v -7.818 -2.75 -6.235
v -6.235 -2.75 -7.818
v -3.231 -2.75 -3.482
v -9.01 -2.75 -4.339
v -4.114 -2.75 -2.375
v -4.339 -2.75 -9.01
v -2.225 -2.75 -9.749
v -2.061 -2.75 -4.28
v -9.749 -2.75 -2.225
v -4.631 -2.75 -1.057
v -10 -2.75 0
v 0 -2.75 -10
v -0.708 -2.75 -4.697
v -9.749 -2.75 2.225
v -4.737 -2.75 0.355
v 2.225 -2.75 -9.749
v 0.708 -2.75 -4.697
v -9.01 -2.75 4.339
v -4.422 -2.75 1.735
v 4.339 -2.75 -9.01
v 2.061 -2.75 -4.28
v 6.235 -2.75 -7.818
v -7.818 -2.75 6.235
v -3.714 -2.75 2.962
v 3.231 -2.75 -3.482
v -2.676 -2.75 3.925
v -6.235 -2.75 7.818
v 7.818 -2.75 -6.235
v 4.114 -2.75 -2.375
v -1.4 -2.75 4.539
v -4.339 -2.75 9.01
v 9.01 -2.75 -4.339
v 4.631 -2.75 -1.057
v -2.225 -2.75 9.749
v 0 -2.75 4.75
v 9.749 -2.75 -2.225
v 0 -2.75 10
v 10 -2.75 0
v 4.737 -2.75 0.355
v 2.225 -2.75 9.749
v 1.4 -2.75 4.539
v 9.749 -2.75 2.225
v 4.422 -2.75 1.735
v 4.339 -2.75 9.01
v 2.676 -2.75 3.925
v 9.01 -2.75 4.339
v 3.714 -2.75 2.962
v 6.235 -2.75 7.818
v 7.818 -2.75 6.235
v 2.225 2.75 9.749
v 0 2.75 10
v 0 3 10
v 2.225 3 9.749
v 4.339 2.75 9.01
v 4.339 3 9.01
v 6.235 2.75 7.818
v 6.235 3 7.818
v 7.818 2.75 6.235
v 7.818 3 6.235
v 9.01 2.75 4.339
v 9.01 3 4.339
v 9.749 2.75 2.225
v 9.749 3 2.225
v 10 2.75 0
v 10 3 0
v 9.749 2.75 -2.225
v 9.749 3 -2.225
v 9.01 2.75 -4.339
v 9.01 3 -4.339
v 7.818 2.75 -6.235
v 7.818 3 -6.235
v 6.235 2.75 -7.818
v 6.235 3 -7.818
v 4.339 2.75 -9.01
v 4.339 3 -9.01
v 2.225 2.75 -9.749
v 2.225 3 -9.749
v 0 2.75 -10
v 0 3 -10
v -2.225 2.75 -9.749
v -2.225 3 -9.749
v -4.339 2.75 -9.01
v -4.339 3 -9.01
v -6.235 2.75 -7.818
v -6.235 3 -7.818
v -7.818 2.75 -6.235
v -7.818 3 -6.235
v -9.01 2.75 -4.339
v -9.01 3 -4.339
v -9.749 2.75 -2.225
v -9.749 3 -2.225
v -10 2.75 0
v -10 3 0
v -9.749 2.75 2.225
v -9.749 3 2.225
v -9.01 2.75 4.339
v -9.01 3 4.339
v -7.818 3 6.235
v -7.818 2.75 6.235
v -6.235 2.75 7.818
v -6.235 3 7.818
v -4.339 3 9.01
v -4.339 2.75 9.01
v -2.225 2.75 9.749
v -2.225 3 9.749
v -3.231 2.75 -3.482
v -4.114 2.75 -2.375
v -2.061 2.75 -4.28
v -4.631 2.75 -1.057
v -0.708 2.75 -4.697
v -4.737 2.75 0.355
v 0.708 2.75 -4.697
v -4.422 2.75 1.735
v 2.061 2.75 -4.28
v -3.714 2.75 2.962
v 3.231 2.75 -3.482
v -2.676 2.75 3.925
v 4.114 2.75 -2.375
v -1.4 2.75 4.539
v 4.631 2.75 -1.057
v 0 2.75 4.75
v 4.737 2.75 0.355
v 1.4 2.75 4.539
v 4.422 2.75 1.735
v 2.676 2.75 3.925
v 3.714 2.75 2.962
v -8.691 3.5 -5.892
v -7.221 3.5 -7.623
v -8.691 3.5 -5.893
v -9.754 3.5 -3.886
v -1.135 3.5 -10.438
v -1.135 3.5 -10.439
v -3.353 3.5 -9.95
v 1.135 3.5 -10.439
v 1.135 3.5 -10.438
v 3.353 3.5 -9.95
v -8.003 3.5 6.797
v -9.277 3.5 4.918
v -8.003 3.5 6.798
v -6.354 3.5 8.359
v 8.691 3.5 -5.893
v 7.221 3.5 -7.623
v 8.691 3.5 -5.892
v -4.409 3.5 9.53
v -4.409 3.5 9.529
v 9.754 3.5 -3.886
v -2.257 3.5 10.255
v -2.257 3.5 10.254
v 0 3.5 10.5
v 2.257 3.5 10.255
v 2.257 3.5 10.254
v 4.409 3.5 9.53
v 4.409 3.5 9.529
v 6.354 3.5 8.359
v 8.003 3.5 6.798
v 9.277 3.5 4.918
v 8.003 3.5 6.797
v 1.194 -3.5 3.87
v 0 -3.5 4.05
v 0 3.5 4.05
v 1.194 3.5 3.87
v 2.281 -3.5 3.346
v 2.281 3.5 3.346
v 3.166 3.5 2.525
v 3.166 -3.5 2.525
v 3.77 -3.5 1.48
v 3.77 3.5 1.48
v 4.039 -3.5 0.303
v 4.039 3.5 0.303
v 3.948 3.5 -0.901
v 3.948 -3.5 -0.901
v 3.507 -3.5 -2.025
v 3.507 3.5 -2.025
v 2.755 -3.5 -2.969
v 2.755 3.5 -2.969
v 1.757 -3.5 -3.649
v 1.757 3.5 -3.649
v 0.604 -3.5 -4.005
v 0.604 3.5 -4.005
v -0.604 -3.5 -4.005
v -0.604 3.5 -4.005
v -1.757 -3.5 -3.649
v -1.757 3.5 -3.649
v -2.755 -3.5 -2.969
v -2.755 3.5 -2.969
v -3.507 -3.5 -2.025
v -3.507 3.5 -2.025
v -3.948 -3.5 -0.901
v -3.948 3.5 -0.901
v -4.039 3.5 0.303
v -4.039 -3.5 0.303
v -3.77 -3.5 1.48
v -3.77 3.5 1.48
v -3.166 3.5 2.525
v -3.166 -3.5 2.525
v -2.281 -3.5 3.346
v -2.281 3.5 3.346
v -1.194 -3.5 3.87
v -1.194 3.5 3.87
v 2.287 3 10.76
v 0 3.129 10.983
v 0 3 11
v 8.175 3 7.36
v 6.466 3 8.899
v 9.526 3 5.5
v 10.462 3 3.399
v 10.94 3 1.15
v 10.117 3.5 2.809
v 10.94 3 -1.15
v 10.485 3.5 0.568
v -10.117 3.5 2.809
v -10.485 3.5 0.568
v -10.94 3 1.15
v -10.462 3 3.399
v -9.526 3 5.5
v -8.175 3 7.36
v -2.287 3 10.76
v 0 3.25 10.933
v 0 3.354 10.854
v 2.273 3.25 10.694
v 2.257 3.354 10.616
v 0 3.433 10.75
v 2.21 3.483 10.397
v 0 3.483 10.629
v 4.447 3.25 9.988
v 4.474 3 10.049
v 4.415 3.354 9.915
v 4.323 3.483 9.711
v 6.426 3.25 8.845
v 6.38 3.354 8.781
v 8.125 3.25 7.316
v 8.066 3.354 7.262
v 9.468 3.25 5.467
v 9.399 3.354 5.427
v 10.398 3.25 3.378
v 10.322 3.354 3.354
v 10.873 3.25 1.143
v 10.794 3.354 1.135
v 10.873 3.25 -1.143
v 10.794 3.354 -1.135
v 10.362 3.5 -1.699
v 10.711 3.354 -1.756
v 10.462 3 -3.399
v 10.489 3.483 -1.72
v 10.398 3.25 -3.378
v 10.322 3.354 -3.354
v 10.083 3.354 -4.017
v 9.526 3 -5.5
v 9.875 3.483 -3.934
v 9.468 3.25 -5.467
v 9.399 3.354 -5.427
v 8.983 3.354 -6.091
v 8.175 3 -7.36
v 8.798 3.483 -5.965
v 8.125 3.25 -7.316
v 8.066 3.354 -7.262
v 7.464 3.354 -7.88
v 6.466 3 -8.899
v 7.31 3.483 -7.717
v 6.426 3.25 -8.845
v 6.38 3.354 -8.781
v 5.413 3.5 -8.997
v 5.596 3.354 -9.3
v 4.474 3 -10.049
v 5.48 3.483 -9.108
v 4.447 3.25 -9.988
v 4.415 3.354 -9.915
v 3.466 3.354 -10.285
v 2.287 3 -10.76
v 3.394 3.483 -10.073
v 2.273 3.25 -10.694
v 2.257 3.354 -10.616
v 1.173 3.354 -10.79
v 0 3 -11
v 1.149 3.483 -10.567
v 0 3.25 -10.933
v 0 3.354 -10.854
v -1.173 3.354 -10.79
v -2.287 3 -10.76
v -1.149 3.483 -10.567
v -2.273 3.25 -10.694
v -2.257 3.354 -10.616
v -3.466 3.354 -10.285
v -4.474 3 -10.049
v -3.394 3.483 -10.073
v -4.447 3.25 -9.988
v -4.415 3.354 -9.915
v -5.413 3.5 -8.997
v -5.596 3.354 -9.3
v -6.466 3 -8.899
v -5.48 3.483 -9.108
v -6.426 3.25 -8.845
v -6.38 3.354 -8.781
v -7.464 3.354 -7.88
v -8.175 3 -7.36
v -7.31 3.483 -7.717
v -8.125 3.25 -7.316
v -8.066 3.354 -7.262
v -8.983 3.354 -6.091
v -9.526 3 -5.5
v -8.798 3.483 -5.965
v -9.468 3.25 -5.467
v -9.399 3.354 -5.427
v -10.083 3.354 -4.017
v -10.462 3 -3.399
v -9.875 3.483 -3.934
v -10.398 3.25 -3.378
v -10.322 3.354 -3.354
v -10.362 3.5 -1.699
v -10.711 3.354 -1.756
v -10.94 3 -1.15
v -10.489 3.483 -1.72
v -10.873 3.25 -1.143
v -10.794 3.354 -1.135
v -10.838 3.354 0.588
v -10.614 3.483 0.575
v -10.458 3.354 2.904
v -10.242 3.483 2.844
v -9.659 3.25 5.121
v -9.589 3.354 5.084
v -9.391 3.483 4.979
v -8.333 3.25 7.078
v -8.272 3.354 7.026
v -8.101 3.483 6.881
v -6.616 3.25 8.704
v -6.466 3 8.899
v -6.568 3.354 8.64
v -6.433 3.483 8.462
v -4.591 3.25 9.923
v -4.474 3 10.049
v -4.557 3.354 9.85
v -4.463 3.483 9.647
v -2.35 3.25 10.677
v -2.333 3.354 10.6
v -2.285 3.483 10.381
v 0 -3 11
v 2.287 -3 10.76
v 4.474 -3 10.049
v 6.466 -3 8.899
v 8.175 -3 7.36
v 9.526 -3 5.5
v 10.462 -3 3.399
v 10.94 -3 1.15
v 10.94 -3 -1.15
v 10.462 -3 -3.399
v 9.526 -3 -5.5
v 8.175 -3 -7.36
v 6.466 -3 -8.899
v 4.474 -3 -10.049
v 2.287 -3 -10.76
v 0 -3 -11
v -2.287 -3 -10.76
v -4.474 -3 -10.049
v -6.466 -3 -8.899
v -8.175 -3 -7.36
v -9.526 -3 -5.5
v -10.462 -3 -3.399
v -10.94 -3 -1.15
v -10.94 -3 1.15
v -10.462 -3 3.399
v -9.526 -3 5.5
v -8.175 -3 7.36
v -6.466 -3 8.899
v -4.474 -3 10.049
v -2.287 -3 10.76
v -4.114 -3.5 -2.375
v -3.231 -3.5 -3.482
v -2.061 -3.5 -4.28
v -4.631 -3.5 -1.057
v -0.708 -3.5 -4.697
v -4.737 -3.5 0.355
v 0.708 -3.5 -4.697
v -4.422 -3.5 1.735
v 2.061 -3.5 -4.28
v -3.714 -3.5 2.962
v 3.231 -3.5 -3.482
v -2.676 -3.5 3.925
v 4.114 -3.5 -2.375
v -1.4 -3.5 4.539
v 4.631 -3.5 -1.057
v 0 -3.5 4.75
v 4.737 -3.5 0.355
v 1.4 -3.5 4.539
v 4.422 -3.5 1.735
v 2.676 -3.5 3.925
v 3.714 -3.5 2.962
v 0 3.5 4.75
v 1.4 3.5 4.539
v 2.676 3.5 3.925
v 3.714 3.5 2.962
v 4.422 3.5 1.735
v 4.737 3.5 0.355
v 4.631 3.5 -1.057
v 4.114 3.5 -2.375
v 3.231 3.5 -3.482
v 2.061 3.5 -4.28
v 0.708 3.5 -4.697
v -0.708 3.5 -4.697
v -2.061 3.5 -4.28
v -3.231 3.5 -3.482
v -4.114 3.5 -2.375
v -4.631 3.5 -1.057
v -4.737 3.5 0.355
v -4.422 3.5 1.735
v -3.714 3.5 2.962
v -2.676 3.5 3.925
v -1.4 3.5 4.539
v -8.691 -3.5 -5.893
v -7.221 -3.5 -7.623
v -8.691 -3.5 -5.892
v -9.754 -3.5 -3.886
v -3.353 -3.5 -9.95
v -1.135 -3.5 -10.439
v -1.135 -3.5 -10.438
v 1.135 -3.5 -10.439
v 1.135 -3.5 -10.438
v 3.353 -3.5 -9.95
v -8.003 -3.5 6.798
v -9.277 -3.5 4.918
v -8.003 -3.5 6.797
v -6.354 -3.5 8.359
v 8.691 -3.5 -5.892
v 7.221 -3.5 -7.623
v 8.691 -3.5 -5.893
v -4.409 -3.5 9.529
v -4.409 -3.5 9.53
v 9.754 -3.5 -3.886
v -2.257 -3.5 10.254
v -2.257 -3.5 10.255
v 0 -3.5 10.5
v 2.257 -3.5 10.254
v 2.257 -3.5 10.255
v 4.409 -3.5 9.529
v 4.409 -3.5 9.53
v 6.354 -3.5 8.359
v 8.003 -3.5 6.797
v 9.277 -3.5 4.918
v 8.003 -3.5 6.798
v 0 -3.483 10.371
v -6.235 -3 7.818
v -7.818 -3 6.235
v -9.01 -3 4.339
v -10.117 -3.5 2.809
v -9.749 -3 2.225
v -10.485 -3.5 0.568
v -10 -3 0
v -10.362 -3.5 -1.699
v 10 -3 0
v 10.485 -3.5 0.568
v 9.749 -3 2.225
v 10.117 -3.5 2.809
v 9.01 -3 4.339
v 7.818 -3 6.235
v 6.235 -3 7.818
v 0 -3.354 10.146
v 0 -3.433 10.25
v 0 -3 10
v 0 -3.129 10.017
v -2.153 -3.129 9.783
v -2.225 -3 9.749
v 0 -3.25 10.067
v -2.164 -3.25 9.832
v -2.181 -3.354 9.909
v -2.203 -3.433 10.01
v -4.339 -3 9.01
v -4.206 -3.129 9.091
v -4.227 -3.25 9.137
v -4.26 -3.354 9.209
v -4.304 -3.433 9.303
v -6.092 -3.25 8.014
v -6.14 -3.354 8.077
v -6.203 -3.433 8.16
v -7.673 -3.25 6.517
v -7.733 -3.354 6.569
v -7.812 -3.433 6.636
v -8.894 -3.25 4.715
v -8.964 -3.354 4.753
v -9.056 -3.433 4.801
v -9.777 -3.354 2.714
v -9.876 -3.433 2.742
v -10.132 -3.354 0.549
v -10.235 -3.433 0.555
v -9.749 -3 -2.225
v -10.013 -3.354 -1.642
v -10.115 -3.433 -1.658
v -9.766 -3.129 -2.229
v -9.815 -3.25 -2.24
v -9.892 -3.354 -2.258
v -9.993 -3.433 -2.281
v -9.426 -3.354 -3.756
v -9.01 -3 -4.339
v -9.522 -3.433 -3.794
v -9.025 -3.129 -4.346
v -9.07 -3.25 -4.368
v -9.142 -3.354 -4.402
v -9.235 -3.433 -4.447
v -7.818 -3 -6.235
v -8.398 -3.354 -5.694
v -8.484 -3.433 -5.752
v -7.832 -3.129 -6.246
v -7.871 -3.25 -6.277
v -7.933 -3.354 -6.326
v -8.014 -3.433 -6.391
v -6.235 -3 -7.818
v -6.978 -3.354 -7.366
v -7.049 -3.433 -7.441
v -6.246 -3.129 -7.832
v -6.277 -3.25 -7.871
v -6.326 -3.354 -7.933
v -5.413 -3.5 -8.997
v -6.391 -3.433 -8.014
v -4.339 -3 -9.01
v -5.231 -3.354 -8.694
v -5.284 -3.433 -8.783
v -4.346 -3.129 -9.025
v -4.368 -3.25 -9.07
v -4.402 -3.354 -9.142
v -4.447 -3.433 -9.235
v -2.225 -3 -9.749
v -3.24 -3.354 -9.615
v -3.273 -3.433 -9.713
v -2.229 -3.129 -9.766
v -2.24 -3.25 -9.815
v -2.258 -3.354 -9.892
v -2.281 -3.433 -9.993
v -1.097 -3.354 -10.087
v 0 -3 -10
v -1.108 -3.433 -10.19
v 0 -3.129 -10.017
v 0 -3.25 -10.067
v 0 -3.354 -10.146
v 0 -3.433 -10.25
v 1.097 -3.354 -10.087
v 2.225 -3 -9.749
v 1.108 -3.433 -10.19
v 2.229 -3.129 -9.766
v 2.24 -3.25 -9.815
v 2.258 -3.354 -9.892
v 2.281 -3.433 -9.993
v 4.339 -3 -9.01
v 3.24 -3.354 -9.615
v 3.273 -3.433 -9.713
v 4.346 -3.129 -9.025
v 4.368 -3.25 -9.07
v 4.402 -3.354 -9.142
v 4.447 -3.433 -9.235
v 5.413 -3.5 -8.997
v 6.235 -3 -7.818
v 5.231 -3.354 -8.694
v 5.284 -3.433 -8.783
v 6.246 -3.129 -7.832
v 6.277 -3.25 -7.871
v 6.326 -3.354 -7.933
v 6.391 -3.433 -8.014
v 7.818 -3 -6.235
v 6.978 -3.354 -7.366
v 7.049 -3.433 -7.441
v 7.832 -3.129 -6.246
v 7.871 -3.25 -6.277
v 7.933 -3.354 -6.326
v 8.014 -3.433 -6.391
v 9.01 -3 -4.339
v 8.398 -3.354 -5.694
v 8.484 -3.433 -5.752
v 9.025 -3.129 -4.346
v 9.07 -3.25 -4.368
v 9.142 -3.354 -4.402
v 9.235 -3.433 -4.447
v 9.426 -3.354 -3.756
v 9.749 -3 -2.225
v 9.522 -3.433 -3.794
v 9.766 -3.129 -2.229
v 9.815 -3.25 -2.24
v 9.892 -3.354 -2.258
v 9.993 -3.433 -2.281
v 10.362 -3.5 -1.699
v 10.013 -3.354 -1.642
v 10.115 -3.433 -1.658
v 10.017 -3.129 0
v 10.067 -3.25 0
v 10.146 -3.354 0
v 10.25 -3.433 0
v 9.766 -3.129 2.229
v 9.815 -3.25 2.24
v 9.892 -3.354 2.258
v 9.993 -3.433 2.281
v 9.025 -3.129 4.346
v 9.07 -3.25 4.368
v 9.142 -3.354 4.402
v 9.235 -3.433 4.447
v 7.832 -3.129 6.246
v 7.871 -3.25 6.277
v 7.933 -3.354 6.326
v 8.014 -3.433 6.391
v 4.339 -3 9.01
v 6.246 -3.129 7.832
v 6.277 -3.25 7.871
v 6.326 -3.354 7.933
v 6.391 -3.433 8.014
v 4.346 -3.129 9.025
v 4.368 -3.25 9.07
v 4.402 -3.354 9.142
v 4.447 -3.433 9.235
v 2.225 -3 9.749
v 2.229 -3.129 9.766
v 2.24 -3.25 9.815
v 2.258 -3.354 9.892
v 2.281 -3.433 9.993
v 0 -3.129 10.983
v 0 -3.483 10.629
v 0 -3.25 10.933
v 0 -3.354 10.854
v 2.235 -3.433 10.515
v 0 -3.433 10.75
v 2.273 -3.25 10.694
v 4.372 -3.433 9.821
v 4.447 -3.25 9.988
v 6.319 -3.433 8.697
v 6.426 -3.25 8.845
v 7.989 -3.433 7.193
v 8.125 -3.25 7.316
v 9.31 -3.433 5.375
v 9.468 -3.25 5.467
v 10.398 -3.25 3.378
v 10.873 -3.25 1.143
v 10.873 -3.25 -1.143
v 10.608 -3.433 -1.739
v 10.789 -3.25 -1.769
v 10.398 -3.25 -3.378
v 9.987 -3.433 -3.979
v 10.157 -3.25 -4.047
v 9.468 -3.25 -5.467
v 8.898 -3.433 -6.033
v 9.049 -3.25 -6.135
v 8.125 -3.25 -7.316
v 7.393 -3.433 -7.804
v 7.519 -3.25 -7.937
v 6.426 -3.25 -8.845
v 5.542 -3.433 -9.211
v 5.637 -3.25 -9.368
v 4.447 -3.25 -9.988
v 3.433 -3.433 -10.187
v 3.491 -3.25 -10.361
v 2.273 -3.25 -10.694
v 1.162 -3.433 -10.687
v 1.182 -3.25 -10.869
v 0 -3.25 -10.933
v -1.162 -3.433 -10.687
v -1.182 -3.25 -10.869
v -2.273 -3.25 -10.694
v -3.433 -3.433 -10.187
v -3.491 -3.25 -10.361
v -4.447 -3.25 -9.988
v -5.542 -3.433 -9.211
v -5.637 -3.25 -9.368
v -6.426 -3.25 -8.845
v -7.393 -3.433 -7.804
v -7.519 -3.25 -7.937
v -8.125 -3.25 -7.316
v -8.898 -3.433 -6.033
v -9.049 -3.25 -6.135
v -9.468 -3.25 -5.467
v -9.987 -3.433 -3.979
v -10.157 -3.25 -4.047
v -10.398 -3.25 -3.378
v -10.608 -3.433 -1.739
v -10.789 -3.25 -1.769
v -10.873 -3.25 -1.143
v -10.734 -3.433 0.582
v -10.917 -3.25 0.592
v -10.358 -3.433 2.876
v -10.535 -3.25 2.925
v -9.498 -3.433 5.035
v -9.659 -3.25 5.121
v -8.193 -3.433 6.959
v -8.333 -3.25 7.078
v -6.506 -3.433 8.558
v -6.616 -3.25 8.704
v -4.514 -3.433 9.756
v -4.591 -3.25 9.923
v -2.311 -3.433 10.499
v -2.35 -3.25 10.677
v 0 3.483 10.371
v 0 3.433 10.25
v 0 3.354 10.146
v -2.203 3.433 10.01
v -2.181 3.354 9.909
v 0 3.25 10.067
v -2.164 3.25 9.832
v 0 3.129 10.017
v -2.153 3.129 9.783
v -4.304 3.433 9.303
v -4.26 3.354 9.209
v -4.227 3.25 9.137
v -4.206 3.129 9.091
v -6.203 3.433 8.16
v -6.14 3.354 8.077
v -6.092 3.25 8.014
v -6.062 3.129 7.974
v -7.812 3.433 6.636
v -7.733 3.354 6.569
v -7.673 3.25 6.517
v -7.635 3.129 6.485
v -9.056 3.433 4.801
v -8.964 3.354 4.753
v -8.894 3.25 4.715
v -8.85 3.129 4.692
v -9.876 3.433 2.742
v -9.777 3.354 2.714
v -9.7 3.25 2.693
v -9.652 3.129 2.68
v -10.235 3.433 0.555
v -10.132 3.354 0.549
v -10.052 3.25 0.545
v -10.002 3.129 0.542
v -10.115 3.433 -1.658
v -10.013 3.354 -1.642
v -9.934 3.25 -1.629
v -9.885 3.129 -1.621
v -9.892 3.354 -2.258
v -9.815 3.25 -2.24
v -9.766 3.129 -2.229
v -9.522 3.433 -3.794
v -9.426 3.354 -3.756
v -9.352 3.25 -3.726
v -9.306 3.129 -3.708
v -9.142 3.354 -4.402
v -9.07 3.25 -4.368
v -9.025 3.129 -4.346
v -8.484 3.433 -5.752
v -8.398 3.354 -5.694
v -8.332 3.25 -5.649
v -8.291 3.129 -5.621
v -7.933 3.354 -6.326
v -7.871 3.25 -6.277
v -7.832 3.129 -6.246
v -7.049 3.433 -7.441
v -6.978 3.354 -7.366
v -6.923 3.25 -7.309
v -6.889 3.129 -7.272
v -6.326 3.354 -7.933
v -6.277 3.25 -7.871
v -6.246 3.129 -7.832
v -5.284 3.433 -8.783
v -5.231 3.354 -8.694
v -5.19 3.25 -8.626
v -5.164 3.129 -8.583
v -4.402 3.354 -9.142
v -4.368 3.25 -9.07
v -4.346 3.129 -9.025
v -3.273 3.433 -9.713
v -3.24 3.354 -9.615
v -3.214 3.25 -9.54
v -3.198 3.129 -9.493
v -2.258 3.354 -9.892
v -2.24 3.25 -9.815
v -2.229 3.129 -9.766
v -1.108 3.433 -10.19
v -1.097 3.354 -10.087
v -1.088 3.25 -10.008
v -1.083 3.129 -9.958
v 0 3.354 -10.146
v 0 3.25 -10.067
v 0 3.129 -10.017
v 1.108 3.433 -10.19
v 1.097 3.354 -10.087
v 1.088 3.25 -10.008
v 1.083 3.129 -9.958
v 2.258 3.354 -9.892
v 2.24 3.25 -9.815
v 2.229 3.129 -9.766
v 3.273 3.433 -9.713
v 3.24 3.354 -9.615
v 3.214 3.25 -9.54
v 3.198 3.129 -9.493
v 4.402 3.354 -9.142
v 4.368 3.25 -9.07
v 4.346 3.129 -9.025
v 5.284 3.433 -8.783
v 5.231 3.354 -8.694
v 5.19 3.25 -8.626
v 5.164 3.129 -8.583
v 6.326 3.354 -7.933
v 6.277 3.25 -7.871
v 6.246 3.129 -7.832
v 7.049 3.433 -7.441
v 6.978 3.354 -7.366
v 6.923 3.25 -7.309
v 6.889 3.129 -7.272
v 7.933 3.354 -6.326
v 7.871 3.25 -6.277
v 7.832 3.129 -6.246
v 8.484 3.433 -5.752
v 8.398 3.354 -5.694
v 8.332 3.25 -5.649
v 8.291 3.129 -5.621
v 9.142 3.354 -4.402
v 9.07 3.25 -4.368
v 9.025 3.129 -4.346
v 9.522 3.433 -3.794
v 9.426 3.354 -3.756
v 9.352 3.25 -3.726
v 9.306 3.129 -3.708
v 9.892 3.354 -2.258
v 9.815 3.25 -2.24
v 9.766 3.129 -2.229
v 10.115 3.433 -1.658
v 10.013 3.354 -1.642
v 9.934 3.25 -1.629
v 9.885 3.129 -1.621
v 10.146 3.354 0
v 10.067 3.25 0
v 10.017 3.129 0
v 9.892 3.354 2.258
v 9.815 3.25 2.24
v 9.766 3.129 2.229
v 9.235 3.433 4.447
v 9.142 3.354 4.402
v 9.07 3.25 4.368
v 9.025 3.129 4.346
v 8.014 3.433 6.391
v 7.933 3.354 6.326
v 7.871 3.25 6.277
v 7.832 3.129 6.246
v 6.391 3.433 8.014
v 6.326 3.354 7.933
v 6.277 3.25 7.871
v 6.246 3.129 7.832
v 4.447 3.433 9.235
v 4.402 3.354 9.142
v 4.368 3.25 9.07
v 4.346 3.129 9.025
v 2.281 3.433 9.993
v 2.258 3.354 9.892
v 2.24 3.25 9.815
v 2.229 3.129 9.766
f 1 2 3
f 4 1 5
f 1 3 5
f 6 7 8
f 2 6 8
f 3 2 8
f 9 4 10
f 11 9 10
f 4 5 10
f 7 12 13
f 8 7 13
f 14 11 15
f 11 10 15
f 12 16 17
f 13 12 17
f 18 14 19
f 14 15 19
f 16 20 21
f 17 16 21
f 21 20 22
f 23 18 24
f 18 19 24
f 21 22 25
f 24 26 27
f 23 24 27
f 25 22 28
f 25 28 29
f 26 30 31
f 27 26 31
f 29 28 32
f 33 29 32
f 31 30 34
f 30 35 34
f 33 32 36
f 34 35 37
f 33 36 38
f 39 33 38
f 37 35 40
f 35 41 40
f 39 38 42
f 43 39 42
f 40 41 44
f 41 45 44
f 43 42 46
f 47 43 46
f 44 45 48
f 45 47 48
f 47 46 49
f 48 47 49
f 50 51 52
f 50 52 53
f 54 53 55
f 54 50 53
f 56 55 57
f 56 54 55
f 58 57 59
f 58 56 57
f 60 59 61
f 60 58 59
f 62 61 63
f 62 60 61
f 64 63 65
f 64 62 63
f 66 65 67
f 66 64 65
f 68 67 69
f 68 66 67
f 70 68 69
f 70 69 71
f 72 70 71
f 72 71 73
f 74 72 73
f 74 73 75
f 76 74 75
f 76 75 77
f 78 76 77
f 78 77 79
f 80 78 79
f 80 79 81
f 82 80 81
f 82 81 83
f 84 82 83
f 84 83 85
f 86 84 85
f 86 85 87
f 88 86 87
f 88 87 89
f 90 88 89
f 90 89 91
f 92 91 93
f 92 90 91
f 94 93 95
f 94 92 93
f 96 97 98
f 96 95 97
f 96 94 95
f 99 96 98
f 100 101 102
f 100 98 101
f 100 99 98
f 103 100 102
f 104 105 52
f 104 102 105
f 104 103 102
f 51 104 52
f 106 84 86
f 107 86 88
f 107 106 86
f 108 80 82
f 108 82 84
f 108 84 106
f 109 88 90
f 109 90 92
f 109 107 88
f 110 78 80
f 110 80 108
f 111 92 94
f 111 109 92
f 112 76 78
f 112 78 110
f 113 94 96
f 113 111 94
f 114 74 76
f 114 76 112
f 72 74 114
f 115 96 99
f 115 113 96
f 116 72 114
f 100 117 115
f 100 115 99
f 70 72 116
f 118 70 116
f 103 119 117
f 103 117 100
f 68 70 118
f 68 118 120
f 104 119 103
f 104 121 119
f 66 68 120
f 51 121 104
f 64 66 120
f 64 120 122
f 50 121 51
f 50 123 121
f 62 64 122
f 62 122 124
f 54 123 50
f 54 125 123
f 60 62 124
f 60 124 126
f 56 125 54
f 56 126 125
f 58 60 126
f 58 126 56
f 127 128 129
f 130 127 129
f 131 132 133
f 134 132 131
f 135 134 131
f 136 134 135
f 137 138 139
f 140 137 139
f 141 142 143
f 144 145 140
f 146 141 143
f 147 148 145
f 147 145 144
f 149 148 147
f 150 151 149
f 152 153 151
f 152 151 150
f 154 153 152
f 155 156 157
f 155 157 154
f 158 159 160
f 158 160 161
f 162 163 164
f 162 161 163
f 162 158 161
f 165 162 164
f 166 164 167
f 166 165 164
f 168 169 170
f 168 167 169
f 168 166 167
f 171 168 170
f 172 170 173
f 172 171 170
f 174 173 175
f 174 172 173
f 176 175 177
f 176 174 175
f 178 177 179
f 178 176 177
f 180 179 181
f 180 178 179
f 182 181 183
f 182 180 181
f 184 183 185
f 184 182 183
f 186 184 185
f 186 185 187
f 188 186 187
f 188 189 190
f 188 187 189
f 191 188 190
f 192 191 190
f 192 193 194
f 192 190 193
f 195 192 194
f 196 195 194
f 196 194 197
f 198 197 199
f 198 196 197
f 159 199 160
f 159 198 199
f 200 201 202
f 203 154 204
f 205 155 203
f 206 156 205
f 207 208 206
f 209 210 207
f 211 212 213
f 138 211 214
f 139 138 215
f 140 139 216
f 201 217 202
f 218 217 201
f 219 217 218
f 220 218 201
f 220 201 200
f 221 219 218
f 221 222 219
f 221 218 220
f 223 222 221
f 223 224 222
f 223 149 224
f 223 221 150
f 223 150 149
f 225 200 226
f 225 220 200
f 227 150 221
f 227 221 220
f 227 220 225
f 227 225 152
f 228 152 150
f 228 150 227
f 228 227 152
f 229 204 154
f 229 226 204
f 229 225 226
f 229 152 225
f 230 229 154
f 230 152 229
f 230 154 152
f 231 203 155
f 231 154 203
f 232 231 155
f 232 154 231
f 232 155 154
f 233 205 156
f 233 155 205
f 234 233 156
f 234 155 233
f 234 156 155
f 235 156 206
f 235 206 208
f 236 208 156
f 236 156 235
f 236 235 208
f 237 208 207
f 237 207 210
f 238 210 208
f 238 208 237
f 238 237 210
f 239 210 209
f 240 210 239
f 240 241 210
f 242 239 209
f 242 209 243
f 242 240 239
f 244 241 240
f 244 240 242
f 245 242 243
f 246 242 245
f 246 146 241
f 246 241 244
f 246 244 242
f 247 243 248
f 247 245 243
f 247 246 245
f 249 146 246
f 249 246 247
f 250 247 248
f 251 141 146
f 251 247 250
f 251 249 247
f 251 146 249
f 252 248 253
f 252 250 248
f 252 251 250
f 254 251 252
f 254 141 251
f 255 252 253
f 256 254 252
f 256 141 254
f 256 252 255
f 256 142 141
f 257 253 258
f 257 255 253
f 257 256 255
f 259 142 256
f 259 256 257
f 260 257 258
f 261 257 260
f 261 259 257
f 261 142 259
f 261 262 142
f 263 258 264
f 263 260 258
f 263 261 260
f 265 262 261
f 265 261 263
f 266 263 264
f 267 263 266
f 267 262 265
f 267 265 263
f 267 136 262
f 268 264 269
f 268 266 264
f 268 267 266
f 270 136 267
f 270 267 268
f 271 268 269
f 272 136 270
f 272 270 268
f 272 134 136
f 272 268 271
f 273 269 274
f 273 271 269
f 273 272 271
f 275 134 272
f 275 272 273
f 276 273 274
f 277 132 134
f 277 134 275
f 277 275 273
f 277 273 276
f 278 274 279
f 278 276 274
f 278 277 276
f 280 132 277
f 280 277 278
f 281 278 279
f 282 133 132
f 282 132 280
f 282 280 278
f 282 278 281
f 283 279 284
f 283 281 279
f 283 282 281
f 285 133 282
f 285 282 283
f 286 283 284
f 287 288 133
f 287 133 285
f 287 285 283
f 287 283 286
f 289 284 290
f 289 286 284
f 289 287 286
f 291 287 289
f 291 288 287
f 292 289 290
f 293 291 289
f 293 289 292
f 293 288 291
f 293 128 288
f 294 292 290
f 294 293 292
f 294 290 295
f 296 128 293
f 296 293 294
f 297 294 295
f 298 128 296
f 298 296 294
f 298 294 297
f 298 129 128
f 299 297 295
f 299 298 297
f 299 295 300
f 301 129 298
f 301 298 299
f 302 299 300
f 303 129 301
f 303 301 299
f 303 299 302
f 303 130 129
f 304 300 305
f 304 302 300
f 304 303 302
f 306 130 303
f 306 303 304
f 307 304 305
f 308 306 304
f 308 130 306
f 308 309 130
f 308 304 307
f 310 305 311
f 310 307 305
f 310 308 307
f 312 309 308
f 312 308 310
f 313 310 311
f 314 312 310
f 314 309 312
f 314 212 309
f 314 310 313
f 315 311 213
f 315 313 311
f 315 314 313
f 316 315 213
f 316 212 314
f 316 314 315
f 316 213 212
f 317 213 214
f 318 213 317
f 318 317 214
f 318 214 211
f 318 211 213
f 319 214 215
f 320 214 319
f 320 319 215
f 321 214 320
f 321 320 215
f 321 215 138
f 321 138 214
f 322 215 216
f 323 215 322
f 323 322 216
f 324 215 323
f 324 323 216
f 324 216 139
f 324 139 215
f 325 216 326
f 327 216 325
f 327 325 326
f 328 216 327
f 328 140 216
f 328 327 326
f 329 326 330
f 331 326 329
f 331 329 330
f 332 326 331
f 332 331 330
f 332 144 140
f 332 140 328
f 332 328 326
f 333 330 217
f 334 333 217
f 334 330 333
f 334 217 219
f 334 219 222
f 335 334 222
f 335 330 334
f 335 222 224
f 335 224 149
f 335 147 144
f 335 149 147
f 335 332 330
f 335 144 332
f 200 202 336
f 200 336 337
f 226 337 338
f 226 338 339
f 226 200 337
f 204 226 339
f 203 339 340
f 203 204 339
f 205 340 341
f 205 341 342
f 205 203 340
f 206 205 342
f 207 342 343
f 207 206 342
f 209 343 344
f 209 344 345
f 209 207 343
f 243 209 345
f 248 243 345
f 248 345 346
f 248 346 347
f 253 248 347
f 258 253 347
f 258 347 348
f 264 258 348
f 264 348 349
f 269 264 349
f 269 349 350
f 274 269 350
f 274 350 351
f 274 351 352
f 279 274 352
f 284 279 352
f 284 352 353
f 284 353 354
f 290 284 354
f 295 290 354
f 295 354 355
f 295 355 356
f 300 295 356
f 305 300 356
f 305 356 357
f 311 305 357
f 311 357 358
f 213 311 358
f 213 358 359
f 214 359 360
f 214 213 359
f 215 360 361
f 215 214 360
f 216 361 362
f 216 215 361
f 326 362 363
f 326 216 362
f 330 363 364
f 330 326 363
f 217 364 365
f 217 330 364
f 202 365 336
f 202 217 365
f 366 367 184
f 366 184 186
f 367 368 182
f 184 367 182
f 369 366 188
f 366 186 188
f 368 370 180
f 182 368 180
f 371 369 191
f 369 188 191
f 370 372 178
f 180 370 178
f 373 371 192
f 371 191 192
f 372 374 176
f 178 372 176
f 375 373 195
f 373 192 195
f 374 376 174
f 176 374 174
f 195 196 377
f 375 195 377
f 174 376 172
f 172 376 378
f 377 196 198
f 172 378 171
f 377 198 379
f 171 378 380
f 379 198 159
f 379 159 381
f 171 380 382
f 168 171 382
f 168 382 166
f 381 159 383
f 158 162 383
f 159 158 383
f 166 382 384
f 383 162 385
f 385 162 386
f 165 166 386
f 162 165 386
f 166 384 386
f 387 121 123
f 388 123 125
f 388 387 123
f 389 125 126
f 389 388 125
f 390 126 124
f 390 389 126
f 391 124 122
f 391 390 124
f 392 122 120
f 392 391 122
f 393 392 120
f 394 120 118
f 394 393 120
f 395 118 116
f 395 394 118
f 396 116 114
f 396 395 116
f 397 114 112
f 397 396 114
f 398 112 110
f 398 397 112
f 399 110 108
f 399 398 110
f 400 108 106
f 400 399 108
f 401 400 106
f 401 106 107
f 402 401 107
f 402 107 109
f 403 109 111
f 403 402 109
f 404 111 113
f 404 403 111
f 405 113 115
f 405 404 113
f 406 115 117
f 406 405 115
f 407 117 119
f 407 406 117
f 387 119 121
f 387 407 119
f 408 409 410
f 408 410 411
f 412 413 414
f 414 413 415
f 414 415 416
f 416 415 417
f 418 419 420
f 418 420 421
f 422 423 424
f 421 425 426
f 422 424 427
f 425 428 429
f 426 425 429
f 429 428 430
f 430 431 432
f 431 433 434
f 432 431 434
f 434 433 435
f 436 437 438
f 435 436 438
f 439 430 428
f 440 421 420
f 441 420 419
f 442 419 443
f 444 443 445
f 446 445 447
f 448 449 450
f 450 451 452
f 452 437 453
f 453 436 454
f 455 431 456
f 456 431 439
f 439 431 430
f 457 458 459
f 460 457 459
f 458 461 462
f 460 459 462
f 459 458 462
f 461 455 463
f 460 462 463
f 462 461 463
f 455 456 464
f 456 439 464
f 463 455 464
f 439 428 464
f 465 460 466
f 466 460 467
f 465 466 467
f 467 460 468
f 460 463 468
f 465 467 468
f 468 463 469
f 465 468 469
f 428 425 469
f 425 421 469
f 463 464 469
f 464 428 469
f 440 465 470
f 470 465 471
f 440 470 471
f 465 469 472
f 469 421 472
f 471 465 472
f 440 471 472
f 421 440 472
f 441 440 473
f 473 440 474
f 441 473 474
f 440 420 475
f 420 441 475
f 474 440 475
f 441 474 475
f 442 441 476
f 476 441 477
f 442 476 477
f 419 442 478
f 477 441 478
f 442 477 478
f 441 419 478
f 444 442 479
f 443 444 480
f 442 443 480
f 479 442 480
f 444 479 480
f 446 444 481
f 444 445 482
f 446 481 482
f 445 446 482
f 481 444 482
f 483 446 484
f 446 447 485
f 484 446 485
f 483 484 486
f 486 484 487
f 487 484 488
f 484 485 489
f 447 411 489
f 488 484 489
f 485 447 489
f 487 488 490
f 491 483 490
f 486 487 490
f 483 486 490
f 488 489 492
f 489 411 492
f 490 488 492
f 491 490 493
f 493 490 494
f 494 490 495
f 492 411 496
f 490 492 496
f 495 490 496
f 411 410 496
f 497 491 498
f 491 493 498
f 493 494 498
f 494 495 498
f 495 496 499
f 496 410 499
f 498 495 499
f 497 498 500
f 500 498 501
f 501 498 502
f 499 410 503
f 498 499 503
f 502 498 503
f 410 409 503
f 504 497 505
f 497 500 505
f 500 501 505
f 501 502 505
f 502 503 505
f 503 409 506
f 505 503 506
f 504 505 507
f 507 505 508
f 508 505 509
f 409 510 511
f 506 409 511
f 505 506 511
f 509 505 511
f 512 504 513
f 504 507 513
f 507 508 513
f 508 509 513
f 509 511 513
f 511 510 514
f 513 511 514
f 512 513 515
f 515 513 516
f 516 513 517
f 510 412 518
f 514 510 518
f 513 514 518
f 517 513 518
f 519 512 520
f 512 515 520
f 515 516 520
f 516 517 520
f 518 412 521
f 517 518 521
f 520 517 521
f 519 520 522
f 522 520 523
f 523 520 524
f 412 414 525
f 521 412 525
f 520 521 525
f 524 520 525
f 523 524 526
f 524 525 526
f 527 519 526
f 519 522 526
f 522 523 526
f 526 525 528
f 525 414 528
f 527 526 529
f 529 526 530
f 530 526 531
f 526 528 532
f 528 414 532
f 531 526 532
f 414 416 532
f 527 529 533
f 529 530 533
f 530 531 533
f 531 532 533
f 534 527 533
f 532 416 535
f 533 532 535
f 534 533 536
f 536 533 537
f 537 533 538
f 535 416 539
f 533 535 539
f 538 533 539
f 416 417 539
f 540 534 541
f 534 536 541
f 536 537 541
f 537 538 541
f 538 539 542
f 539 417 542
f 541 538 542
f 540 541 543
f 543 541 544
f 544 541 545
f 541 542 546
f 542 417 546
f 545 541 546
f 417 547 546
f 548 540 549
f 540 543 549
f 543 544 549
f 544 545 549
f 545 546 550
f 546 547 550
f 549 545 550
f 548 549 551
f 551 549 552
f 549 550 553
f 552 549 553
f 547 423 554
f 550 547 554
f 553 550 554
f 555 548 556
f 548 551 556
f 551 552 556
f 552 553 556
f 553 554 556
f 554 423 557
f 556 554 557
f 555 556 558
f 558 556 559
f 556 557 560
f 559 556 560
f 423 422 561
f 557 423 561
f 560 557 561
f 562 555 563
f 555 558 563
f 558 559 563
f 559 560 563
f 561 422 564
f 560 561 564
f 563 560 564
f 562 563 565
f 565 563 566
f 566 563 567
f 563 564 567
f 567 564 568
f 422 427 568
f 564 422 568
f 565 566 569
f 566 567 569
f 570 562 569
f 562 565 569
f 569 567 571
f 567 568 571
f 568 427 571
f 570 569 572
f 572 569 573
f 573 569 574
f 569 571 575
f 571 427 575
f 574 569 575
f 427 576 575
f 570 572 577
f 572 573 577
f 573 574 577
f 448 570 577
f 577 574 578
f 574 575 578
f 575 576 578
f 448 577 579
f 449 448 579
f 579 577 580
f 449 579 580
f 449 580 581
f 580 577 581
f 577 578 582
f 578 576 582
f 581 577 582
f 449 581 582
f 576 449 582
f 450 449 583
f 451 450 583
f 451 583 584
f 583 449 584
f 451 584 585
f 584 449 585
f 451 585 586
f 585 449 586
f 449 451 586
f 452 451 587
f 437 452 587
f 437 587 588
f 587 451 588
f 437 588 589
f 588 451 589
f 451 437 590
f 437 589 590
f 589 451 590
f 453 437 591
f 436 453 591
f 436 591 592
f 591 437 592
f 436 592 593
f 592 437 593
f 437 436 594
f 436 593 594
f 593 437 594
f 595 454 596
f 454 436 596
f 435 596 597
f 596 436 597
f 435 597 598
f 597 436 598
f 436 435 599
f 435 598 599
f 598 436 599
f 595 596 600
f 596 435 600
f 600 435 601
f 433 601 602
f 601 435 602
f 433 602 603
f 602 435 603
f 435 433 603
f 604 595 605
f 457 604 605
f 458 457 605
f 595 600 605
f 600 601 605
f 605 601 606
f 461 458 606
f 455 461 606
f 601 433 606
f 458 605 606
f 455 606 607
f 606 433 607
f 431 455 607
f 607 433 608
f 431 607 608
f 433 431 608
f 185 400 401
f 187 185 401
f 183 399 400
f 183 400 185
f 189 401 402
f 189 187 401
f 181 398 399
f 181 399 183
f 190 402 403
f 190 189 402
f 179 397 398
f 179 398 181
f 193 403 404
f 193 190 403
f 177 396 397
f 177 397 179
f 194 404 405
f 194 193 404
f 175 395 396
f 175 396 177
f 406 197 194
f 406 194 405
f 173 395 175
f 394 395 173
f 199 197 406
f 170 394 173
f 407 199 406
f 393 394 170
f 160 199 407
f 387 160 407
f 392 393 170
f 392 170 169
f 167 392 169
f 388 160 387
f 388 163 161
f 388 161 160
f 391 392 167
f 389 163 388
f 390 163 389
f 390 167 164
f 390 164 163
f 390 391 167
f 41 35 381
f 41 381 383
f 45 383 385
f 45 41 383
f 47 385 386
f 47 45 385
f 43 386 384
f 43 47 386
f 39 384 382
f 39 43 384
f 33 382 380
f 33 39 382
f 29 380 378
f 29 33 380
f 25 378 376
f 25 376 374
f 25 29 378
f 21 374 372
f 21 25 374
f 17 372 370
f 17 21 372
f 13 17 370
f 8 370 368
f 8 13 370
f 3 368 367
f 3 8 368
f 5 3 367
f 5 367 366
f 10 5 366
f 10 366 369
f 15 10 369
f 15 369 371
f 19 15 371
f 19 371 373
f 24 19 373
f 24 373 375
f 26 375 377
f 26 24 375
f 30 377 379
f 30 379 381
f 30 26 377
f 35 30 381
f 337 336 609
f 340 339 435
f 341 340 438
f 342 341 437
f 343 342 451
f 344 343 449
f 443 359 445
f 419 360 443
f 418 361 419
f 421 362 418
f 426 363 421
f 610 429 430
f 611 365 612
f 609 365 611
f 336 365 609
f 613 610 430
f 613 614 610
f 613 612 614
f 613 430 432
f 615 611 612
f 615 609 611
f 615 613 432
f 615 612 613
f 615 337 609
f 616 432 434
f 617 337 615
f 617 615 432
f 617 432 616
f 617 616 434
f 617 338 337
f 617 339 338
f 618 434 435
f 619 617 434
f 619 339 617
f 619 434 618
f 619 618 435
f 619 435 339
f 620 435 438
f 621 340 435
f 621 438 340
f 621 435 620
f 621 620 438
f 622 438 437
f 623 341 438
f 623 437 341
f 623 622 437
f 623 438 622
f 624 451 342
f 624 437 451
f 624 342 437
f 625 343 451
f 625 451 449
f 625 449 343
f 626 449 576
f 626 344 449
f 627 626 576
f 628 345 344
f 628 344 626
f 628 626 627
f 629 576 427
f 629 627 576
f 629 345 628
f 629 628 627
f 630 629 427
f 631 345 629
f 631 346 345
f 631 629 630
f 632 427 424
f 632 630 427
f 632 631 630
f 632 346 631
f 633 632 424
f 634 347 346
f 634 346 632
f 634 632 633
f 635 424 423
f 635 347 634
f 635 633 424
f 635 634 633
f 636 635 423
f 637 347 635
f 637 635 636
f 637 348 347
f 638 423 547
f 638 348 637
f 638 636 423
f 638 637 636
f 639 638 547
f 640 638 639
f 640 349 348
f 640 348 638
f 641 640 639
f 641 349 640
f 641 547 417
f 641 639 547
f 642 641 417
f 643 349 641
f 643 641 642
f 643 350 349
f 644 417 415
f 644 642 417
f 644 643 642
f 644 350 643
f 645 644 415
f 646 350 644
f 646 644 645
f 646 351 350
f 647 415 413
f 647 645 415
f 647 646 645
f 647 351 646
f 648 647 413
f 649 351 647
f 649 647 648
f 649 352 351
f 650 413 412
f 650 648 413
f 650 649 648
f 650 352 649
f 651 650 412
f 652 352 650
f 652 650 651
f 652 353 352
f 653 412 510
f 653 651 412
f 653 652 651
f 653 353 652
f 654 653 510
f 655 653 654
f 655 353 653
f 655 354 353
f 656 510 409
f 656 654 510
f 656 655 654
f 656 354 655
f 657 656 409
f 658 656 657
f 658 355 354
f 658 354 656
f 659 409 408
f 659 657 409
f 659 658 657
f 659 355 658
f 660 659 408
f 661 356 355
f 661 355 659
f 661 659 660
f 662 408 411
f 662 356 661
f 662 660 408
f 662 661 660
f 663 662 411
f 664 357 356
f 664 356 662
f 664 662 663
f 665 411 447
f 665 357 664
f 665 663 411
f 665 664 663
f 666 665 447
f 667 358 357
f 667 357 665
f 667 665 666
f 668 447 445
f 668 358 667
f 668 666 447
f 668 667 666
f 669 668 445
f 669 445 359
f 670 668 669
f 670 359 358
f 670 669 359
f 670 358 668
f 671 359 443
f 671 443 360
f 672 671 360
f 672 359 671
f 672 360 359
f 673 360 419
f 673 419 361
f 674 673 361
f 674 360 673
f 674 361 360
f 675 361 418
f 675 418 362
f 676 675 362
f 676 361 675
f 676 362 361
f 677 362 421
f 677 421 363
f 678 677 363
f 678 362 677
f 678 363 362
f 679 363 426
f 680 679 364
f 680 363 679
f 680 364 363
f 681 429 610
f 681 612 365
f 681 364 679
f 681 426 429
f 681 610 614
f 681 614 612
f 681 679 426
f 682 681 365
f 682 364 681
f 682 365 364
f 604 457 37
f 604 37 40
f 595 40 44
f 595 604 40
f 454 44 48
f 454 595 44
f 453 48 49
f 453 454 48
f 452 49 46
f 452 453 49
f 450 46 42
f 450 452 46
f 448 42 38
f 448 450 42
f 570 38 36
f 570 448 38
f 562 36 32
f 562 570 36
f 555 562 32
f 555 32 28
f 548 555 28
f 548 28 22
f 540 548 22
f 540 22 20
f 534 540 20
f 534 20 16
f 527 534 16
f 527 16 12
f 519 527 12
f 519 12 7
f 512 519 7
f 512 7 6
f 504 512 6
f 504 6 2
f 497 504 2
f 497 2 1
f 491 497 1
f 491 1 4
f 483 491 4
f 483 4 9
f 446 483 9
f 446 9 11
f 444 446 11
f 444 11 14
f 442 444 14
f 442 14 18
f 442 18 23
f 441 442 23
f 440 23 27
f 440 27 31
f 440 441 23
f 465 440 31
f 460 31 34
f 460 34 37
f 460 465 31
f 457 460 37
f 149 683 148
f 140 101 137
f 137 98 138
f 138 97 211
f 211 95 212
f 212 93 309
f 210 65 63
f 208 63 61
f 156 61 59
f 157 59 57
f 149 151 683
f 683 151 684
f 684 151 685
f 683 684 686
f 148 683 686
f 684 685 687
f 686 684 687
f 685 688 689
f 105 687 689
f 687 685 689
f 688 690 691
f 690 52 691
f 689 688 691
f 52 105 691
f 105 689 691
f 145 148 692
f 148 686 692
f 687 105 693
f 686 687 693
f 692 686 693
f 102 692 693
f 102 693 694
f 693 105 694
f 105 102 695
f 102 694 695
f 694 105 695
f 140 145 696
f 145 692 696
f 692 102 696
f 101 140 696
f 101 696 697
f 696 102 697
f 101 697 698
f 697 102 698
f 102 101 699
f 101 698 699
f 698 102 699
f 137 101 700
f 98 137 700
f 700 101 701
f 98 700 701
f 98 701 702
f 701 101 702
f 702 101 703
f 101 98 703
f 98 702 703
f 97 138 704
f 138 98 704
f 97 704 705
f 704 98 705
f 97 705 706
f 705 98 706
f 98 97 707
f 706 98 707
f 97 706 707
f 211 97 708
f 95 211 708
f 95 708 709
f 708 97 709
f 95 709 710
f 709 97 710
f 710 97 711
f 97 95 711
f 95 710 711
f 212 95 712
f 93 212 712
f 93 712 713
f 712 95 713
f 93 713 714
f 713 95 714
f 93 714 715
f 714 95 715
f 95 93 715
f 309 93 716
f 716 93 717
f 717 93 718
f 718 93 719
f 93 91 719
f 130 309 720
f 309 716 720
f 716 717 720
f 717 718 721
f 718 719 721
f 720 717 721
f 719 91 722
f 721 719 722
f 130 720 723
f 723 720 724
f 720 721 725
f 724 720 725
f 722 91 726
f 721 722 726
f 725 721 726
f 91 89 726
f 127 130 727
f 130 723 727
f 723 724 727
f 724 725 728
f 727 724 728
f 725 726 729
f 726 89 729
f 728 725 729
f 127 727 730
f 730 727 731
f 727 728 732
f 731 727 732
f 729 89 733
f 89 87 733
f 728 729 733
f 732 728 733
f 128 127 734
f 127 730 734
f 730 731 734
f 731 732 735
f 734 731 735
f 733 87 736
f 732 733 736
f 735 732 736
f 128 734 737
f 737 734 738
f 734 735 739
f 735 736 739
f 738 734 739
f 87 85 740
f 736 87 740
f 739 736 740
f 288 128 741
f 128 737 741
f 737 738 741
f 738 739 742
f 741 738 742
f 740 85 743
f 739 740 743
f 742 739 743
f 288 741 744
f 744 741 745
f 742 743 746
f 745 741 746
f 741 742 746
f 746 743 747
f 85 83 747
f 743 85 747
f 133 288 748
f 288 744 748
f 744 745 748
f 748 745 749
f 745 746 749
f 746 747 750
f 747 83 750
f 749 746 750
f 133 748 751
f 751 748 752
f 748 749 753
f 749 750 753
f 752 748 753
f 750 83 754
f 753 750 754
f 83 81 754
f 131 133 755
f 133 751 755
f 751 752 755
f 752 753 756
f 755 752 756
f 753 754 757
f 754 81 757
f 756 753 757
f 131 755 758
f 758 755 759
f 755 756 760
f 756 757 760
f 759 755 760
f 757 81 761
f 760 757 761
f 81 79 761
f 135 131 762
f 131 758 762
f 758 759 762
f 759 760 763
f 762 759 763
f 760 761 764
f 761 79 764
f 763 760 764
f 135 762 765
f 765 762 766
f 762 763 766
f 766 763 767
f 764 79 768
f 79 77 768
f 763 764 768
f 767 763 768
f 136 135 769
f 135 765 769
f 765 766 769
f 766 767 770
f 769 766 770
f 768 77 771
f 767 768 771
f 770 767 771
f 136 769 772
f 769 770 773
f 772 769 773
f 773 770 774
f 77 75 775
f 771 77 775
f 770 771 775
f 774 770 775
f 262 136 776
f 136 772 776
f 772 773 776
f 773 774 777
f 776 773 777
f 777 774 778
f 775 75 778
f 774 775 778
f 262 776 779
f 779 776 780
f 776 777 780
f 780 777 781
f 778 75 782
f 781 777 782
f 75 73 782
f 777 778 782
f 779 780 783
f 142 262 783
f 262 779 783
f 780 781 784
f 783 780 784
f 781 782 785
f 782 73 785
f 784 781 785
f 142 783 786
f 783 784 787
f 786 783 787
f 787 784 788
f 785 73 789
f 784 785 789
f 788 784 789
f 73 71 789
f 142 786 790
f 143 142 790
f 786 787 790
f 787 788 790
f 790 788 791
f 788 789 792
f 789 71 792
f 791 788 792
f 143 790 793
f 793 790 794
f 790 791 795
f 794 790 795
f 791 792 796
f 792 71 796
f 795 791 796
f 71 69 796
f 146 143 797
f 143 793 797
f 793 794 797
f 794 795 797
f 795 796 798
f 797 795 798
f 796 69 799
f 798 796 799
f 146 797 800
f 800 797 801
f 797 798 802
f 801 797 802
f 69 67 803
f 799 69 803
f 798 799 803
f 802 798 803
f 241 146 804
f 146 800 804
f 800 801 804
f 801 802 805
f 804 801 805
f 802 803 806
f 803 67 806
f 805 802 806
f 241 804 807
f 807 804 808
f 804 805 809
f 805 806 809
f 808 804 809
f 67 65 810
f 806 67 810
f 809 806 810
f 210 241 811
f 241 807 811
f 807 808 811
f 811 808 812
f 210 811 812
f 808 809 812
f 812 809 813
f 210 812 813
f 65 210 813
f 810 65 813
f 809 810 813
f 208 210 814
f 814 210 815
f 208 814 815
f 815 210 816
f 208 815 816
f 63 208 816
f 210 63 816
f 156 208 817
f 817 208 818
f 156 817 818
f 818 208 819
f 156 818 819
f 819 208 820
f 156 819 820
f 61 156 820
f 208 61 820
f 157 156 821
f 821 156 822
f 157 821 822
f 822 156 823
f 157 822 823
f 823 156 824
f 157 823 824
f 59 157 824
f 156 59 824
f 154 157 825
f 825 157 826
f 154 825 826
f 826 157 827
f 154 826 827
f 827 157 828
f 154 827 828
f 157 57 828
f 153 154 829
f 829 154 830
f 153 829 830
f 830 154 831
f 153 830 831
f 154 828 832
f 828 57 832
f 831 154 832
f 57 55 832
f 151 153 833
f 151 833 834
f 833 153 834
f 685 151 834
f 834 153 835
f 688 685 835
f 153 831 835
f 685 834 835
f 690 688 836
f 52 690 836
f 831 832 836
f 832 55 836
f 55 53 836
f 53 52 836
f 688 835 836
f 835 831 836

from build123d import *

# Parameters (mm, degrees)
SKETCH1_R               = 11
BOSS_EXTRUDE1_DEPTH     = 3.5
CUT_EXTRUDE1_DEPTH      = 16.945218719
CUT_EXTRUDE1_DEPTH_BACK = 16.945218719
SKETCH2_R               = 10
SKETCH3_R               = 10
BOSS_EXTRUDE2_DEPTH     = 2.75
CUT_EXTRUDE2_DEPTH      = 16.945218719
CUT_EXTRUDE2_DEPTH_BACK = 16.945218719
SKETCH4_R               = 4.75
SKETCH5_R               = 4.75
BOSS_EXTRUDE3_DEPTH     = 3.5
CUT_EXTRUDE3_DEPTH      = 16.945218719
CUT_EXTRUDE3_DEPTH_BACK = 16.945218719
SKETCH6_R               = 4.05
FILLET1_R               = 0.5


with BuildPart() as part:
    # Sketch1 → Boss-Extrude1 (new, symmetric)
    with BuildSketch(Plane(origin=(0, 0, 0), x_dir=(1, 0, 0), z_dir=(0, 1, 0))):
        with Locations(Location((0, 0, 0), (0, 0, 270))):
            Circle(SKETCH1_R)
    extrude(amount=BOSS_EXTRUDE1_DEPTH, both=True)

    # Sketch2 → Cut-Extrude1 (cut, two sides: drawn at the far end of the back side and taken through both)
    with BuildSketch(Plane(origin=(0, 0, 0), x_dir=(1, 0, 0), z_dir=(0, 1, 0)).offset(-CUT_EXTRUDE1_DEPTH_BACK)):
        with Locations(Location((0, 0, 0), (0, 0, 270))):
            Circle(SKETCH2_R)
    extrude(amount=CUT_EXTRUDE1_DEPTH + CUT_EXTRUDE1_DEPTH_BACK, mode=Mode.SUBTRACT)

    # Sketch3 → Boss-Extrude2 (add, symmetric)
    with BuildSketch(Plane(origin=(0, 0, 0), x_dir=(1, 0, 0), z_dir=(0, 1, 0))):
        with Locations(Location((0, 0, 0), (0, 0, 270))):
            Circle(SKETCH3_R)
    extrude(amount=BOSS_EXTRUDE2_DEPTH, both=True)

    # Sketch4 → Cut-Extrude2 (cut, two sides: drawn at the far end of the back side and taken through both)
    with BuildSketch(Plane(origin=(0, 0, 0), x_dir=(1, 0, 0), z_dir=(0, 1, 0)).offset(-CUT_EXTRUDE2_DEPTH_BACK)):
        with Locations(Location((0, 0, 0), (0, 0, 270))):
            Circle(SKETCH4_R)
    extrude(amount=CUT_EXTRUDE2_DEPTH + CUT_EXTRUDE2_DEPTH_BACK, mode=Mode.SUBTRACT)

    # Sketch5 → Boss-Extrude3 (add, symmetric)
    with BuildSketch(Plane(origin=(0, 0, 0), x_dir=(1, 0, 0), z_dir=(0, 1, 0))):
        with Locations(Location((0, 0, 0), (0, 0, 270))):
            Circle(SKETCH5_R)
    extrude(amount=BOSS_EXTRUDE3_DEPTH, both=True)

    # Sketch6 → Cut-Extrude3 (cut, two sides: drawn at the far end of the back side and taken through both)
    with BuildSketch(Plane(origin=(0, 0, 0), x_dir=(1, 0, 0), z_dir=(0, 1, 0)).offset(-CUT_EXTRUDE3_DEPTH_BACK)):
        with Locations(Location((0, 0, 0), (0, 0, 270))):
            Circle(SKETCH6_R)
    extrude(amount=CUT_EXTRUDE3_DEPTH + CUT_EXTRUDE3_DEPTH_BACK, mode=Mode.SUBTRACT)

    # Fillet1
    fillet1_edges = [part.edges().sort_by_distance(p)[0] for p in [
        (0, -3.5, -11),
        (0, 3.5, -11),
        (0, -3.5, -10),
        (0, 3.5, -10),
    ]]
    fillet(fillet1_edges, radius=FILLET1_R - 0.0001)  # a hair under: the kernel refuses the full size


solid = part.part
